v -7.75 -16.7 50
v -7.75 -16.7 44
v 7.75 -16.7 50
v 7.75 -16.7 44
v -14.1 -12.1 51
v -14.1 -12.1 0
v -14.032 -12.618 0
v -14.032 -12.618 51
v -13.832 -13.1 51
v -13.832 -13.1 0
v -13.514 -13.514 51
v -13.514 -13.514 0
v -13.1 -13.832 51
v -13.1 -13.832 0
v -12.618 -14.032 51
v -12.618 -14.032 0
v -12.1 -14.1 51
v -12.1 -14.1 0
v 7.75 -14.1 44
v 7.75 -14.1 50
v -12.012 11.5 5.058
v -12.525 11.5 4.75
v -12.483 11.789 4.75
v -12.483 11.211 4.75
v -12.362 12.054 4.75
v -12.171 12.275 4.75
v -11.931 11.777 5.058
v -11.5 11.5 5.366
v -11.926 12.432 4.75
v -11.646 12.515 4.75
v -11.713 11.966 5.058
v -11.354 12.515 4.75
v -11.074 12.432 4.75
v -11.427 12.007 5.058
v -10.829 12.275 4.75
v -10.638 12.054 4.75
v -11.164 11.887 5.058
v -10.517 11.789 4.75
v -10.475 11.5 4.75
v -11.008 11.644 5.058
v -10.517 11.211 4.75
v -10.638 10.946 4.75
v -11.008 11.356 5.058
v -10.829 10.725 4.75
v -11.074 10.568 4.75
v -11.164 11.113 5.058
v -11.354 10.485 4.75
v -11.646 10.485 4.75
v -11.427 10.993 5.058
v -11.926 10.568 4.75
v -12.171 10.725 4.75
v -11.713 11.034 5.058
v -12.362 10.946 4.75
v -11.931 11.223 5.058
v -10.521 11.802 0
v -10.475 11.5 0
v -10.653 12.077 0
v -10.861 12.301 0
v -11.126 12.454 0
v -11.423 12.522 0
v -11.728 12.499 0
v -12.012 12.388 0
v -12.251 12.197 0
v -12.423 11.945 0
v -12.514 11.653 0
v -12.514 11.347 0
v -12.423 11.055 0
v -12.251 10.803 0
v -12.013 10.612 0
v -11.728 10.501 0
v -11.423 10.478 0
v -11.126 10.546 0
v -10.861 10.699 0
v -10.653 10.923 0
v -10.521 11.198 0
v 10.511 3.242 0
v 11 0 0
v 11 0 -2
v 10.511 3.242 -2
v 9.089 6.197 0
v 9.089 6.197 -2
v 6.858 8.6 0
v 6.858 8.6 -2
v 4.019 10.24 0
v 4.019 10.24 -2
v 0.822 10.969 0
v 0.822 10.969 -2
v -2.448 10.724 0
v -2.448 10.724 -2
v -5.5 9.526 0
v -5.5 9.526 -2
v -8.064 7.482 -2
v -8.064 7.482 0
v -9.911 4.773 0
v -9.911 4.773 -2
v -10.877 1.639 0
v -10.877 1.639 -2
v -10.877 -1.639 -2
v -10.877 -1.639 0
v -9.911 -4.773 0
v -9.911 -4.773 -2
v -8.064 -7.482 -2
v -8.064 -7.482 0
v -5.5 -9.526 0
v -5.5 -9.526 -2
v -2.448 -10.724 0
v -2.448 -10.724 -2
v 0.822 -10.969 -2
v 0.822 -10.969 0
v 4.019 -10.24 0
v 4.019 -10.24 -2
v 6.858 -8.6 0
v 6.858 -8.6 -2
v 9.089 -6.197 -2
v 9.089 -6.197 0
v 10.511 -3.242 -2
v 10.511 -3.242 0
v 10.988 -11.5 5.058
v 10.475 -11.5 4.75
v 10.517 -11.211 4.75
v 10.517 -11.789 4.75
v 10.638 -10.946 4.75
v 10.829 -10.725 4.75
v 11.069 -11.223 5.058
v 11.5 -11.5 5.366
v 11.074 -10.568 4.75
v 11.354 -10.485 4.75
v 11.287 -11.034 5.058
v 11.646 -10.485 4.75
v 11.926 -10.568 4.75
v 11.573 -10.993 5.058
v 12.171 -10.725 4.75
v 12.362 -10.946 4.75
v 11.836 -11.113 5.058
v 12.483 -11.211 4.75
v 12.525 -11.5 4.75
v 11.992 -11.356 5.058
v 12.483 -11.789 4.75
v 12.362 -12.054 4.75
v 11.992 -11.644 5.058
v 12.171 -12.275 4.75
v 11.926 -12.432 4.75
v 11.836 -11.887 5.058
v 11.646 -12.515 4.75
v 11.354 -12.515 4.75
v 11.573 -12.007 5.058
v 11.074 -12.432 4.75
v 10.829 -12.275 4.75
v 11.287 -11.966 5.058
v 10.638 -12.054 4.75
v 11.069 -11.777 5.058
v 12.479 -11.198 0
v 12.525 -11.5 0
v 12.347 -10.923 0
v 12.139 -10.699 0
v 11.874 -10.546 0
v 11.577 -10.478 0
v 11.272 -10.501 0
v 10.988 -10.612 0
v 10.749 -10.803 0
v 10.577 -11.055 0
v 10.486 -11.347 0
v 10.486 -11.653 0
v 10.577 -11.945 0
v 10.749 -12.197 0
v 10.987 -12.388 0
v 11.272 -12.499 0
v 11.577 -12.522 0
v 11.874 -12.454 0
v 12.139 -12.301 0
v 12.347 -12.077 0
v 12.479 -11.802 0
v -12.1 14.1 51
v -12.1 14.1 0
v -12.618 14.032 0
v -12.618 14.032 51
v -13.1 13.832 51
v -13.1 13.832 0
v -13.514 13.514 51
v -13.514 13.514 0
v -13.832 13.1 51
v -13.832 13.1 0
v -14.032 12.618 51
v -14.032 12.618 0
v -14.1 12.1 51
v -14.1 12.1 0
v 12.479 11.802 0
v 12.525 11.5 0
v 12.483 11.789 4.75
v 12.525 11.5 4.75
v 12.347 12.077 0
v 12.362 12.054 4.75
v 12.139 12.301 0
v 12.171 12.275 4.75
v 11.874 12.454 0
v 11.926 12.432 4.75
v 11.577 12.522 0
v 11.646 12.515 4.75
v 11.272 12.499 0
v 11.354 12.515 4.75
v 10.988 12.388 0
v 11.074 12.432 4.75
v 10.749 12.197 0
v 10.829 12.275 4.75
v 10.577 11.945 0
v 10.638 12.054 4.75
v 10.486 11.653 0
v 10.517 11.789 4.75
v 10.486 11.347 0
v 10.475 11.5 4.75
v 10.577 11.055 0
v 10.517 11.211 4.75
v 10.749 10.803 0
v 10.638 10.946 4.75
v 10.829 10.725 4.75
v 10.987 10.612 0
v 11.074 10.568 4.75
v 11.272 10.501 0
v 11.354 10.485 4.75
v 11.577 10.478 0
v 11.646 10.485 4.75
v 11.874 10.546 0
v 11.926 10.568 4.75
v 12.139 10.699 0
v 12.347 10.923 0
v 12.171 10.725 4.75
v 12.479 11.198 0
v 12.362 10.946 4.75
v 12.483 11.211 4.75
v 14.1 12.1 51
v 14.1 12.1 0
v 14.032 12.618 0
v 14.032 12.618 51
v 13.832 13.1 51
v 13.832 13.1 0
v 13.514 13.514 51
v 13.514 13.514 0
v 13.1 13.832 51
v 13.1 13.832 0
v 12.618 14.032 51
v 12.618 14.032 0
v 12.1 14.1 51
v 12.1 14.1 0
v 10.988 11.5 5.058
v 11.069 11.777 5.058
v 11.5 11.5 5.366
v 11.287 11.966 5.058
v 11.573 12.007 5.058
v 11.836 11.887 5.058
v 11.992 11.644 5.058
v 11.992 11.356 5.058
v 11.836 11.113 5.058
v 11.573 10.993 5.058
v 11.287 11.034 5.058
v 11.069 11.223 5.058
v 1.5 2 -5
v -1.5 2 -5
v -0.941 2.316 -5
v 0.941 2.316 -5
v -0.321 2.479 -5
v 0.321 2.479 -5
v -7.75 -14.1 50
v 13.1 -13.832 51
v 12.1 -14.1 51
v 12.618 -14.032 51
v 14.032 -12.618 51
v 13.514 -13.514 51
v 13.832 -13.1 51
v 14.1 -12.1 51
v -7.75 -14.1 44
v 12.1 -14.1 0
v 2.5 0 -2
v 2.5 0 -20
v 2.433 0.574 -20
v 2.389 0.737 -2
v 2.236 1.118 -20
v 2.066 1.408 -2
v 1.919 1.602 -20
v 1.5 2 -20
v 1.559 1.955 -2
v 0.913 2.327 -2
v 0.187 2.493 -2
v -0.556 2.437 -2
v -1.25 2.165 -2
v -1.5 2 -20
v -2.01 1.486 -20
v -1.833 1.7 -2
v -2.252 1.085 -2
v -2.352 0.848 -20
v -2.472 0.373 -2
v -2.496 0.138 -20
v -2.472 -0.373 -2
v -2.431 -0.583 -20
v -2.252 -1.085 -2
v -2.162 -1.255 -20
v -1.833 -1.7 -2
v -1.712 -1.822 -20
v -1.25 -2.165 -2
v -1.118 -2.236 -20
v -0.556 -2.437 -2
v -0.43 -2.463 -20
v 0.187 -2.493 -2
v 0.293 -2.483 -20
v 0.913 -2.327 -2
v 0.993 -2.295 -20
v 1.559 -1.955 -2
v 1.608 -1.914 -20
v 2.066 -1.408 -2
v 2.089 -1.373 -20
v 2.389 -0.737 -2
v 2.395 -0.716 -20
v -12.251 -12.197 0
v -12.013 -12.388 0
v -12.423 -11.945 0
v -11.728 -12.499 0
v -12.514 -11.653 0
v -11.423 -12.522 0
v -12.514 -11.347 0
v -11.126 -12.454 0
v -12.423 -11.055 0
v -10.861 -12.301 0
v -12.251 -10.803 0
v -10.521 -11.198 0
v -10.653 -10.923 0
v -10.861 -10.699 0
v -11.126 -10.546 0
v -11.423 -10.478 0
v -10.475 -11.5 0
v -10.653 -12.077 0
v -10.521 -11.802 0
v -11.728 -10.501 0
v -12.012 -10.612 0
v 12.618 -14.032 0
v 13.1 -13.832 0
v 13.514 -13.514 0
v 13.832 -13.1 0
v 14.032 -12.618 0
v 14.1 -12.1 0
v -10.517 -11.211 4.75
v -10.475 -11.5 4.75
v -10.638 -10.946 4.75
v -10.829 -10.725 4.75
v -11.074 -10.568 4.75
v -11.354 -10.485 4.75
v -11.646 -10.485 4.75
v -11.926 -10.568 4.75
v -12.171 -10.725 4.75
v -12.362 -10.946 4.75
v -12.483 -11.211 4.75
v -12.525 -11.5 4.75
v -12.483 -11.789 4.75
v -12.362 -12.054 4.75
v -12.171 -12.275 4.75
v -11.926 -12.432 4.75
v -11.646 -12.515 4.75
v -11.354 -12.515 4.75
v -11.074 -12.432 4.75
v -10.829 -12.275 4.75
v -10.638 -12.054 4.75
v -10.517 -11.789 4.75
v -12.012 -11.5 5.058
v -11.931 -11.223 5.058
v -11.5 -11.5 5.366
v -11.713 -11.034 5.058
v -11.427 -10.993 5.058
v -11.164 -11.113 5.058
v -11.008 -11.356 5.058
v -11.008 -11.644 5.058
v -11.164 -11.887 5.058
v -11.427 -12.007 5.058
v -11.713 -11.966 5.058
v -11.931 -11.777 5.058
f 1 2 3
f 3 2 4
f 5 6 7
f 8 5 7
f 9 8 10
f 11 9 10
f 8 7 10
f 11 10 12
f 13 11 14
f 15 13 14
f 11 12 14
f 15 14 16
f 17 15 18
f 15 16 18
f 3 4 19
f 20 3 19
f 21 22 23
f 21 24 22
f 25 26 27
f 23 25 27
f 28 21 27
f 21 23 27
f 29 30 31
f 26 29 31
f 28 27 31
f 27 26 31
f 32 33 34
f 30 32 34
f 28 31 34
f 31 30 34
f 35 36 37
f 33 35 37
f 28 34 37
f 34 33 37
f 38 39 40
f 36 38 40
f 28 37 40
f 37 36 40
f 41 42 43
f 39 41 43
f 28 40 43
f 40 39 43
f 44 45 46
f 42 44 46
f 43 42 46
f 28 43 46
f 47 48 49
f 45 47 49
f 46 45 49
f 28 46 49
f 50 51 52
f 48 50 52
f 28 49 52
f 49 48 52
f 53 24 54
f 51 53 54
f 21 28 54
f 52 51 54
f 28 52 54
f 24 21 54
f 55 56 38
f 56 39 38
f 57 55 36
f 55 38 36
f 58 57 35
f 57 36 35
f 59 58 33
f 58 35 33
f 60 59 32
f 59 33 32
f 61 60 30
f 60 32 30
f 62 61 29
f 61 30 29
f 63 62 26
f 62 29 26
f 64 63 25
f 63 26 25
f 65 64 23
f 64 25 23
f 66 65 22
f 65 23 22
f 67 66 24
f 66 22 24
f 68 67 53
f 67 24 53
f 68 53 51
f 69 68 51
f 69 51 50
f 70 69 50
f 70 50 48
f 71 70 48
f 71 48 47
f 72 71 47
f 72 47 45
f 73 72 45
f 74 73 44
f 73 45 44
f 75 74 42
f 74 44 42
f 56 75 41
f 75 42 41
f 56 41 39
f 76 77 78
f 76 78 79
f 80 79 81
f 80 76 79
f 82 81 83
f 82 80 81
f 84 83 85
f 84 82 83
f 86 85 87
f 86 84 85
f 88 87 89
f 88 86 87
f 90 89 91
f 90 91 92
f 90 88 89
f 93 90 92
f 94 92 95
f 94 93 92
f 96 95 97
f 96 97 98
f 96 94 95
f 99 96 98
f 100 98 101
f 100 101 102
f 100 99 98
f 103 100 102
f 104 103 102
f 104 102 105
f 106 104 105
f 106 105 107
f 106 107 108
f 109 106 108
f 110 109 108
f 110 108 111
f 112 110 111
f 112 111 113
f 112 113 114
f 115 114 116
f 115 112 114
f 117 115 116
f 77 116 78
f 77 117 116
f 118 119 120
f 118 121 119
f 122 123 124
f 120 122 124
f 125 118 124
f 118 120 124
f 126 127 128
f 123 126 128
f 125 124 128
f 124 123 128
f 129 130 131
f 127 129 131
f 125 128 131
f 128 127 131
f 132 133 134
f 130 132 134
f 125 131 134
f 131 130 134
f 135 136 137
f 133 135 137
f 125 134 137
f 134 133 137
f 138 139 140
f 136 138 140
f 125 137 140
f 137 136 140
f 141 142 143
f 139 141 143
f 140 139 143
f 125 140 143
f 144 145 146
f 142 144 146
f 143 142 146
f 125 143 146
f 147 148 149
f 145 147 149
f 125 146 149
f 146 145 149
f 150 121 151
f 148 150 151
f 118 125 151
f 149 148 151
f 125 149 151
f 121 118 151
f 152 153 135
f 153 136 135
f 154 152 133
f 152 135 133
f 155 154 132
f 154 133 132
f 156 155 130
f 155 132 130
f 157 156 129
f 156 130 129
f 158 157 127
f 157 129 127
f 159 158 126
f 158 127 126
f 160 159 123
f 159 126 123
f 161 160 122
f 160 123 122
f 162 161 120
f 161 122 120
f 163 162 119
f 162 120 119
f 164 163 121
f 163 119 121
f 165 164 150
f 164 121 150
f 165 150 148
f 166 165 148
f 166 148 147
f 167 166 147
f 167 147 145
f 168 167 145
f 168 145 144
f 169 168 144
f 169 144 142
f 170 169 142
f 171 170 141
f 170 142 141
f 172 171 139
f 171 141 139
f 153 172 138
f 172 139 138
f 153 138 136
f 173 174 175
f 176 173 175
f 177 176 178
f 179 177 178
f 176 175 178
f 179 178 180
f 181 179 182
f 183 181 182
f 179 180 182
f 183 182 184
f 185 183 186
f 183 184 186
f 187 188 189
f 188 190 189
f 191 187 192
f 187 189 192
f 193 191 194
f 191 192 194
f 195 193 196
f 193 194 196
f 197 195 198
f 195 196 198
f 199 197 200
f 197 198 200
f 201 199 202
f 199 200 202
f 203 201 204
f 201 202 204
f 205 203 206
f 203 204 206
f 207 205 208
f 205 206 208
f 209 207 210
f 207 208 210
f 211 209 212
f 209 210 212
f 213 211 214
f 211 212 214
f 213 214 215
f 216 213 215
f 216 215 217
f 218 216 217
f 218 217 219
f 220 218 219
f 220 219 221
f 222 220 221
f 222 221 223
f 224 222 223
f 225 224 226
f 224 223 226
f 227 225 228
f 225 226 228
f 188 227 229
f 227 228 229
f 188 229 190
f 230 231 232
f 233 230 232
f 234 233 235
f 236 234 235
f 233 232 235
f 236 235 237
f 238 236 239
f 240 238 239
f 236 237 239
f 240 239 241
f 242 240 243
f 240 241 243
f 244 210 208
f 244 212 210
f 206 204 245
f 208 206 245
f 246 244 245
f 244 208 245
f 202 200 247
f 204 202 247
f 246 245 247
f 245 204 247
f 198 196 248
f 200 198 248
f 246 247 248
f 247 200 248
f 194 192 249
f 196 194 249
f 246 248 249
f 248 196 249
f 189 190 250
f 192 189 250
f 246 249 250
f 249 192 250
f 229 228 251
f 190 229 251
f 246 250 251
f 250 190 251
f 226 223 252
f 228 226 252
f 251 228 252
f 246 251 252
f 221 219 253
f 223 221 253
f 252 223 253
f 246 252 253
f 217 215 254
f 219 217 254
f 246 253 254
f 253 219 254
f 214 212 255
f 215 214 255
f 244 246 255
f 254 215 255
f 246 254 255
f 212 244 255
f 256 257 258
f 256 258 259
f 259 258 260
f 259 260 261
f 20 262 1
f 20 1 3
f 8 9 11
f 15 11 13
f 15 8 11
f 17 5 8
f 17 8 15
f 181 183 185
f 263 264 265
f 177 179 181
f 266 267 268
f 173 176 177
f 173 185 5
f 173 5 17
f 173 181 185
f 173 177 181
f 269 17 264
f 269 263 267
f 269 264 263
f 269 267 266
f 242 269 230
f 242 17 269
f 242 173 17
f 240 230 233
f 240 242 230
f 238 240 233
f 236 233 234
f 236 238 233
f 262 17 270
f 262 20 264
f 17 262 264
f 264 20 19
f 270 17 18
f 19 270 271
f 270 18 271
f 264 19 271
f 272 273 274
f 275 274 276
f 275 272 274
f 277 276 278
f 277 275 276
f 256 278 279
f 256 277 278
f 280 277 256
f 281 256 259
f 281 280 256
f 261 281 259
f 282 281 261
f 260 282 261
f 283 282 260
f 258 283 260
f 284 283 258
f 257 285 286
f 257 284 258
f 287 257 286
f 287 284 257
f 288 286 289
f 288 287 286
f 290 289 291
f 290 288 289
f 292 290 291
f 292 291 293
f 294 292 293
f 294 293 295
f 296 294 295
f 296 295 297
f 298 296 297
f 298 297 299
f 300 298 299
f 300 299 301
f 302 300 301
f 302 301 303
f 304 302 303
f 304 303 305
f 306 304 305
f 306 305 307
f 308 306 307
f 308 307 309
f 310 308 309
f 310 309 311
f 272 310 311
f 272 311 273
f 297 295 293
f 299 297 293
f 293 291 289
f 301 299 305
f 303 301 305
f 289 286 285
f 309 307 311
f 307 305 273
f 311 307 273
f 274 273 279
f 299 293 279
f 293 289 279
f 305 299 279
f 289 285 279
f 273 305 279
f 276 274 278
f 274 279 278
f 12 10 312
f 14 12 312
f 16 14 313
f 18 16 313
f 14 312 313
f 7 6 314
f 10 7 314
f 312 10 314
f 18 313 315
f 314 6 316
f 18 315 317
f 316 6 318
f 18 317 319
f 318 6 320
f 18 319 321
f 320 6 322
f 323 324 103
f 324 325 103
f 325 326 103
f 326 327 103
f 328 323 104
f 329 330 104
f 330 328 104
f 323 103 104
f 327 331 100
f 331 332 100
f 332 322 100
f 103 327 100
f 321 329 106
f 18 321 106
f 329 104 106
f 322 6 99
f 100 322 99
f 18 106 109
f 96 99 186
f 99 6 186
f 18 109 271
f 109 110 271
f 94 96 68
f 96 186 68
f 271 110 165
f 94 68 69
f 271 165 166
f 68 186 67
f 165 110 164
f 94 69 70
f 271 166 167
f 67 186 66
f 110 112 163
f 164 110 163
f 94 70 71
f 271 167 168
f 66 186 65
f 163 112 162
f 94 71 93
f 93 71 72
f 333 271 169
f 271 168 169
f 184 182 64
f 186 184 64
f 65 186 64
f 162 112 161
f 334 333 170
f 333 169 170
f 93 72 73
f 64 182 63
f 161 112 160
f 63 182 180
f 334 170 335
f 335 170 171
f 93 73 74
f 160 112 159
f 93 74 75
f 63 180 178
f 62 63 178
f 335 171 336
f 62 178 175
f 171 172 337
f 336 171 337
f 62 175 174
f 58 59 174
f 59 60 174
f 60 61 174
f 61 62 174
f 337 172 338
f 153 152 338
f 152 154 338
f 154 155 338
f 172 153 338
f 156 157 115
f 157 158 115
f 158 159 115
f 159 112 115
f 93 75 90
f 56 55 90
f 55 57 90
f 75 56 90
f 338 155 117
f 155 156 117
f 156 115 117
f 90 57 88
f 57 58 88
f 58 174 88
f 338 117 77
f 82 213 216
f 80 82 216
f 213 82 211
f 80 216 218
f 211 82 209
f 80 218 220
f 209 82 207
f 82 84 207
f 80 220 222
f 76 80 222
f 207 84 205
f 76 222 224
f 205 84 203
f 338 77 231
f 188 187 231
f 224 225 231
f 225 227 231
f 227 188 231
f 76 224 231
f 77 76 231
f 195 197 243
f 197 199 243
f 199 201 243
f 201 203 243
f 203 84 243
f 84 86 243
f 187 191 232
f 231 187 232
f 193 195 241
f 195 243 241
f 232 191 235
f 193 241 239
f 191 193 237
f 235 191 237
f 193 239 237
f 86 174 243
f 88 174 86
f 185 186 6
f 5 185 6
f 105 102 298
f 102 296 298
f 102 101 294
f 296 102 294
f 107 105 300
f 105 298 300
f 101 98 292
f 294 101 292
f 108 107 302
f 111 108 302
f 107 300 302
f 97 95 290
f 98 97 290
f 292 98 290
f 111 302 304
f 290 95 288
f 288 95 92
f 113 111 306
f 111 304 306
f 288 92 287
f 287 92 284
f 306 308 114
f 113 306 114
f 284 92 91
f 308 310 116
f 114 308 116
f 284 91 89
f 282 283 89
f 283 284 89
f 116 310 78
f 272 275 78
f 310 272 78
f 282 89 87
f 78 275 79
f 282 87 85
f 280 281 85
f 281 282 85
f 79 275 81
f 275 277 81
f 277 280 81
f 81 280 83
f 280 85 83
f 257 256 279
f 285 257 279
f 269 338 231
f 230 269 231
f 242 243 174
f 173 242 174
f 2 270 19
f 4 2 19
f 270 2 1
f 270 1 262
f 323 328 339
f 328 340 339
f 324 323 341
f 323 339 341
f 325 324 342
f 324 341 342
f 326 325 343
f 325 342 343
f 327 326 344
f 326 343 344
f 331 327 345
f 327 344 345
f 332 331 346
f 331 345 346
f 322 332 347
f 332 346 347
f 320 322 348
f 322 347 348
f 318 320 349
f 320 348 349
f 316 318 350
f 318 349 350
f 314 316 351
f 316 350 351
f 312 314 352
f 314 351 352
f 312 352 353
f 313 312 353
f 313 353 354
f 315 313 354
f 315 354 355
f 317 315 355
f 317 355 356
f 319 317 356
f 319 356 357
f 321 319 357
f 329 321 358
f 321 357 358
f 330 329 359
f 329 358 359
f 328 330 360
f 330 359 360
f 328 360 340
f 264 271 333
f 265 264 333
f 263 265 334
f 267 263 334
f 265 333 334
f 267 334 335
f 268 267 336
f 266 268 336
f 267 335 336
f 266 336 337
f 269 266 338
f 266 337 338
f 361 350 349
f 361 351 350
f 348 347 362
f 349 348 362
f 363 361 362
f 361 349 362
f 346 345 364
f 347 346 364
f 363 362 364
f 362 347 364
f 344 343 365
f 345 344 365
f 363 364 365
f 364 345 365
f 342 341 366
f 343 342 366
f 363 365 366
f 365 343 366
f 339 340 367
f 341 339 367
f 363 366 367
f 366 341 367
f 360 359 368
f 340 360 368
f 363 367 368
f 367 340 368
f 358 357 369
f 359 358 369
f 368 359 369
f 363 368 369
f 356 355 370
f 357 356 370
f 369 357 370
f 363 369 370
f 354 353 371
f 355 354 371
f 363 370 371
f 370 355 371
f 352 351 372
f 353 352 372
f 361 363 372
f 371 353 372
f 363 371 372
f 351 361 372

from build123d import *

# Parameters (mm, degrees)
EXTRUDE_2_DEPTH          = 51
HOLE_WIZARD_M2_5_1_D     = 2.05
HOLE_WIZARD_M2_5_1_DEPTH = 4.75
HOLE_WIZARD_M2_5_1_TIP   = 0.615882135
SKETCH_7_R               = 11
SKETCH_7_R_2             = 2.5
EXTRUDE_3_DEPTH          = 2
SKETCH_7_2_R             = 2.5
EXTRUDE_4_DEPTH          = 20
SKETCH_8_W               = 15
SKETCH_8_H               = 0.5
CUT_EXTRUDE_1_DEPTH      = 1.5
SKETCH_9_W               = 15.5
SKETCH_9_H               = 2.6
EXTRUDE_5_DEPTH          = 6


with BuildPart() as part:
    # 草图1 → 凸台-拉伸2 (new body)
    with BuildSketch(Plane.XY):
        with BuildLine():
            Line((-12.1, -14.1), (12.1, -14.1))
            ThreePointArc((12.1, -14.1), (13.514213562, -13.514213562), (14.1, -12.1))
            Line((14.1, -12.1), (14.1, 12.1))
            ThreePointArc((14.1, 12.1), (13.514213562, 13.514213562), (12.1, 14.1))
            Line((12.1, 14.1), (-12.1, 14.1))
            ThreePointArc((-12.1, 14.1), (-13.514213562, 13.514213562), (-14.1, 12.1))
            Line((-14.1, 12.1), (-14.1, -12.1))
            ThreePointArc((-14.1, -12.1), (-13.514213562, -13.514213562), (-12.1, -14.1))
        make_face()
    extrude(amount=EXTRUDE_2_DEPTH)

    # M2.5 螺纹孔1
    with Locations(Plane(origin=(0, 0, 0), x_dir=(-1, 0, 0), z_dir=(0, 0, -1))):
        with Locations((-11.5, 11.5), (11.5, 11.5), (11.5, -11.5), (-11.5, -11.5)):
            Hole(HOLE_WIZARD_M2_5_1_D / 2, depth=HOLE_WIZARD_M2_5_1_DEPTH)
            with Locations((0, 0, -(HOLE_WIZARD_M2_5_1_DEPTH + HOLE_WIZARD_M2_5_1_TIP / 2))):  # 118° drill point
                Cone(0, HOLE_WIZARD_M2_5_1_D / 2, HOLE_WIZARD_M2_5_1_TIP, mode=Mode.SUBTRACT)

    # 草图7 → 凸台-拉伸3 (add)
    with BuildSketch(Plane.XY):
        Circle(SKETCH_7_R)
        Circle(SKETCH_7_R_2, mode=Mode.SUBTRACT)
    extrude(amount=-EXTRUDE_3_DEPTH)

    # 草图7<2> → 凸台-拉伸4 (add)
    with BuildSketch(Plane.XY):
        Circle(SKETCH_7_2_R)
    extrude(amount=-EXTRUDE_4_DEPTH)

    # 草图8 → 切除-拉伸1 (cut, symmetric)
    with BuildSketch(Plane(origin=(0, 0, 0), x_dir=(0, 0, -1), z_dir=(1, 0, 0))):
        with Locations((12.5, 2.25)):
            Rectangle(SKETCH_8_W, SKETCH_8_H)
    extrude(amount=CUT_EXTRUDE_1_DEPTH, both=True, mode=Mode.SUBTRACT)

    # 草图9 → 凸台-拉伸5 (add)
    with BuildSketch(Plane.XY.offset(44)):
        with Locations((0, -15.4)):
            Rectangle(SKETCH_9_W, SKETCH_9_H)
    extrude(amount=EXTRUDE_5_DEPTH)


solid = part.part
